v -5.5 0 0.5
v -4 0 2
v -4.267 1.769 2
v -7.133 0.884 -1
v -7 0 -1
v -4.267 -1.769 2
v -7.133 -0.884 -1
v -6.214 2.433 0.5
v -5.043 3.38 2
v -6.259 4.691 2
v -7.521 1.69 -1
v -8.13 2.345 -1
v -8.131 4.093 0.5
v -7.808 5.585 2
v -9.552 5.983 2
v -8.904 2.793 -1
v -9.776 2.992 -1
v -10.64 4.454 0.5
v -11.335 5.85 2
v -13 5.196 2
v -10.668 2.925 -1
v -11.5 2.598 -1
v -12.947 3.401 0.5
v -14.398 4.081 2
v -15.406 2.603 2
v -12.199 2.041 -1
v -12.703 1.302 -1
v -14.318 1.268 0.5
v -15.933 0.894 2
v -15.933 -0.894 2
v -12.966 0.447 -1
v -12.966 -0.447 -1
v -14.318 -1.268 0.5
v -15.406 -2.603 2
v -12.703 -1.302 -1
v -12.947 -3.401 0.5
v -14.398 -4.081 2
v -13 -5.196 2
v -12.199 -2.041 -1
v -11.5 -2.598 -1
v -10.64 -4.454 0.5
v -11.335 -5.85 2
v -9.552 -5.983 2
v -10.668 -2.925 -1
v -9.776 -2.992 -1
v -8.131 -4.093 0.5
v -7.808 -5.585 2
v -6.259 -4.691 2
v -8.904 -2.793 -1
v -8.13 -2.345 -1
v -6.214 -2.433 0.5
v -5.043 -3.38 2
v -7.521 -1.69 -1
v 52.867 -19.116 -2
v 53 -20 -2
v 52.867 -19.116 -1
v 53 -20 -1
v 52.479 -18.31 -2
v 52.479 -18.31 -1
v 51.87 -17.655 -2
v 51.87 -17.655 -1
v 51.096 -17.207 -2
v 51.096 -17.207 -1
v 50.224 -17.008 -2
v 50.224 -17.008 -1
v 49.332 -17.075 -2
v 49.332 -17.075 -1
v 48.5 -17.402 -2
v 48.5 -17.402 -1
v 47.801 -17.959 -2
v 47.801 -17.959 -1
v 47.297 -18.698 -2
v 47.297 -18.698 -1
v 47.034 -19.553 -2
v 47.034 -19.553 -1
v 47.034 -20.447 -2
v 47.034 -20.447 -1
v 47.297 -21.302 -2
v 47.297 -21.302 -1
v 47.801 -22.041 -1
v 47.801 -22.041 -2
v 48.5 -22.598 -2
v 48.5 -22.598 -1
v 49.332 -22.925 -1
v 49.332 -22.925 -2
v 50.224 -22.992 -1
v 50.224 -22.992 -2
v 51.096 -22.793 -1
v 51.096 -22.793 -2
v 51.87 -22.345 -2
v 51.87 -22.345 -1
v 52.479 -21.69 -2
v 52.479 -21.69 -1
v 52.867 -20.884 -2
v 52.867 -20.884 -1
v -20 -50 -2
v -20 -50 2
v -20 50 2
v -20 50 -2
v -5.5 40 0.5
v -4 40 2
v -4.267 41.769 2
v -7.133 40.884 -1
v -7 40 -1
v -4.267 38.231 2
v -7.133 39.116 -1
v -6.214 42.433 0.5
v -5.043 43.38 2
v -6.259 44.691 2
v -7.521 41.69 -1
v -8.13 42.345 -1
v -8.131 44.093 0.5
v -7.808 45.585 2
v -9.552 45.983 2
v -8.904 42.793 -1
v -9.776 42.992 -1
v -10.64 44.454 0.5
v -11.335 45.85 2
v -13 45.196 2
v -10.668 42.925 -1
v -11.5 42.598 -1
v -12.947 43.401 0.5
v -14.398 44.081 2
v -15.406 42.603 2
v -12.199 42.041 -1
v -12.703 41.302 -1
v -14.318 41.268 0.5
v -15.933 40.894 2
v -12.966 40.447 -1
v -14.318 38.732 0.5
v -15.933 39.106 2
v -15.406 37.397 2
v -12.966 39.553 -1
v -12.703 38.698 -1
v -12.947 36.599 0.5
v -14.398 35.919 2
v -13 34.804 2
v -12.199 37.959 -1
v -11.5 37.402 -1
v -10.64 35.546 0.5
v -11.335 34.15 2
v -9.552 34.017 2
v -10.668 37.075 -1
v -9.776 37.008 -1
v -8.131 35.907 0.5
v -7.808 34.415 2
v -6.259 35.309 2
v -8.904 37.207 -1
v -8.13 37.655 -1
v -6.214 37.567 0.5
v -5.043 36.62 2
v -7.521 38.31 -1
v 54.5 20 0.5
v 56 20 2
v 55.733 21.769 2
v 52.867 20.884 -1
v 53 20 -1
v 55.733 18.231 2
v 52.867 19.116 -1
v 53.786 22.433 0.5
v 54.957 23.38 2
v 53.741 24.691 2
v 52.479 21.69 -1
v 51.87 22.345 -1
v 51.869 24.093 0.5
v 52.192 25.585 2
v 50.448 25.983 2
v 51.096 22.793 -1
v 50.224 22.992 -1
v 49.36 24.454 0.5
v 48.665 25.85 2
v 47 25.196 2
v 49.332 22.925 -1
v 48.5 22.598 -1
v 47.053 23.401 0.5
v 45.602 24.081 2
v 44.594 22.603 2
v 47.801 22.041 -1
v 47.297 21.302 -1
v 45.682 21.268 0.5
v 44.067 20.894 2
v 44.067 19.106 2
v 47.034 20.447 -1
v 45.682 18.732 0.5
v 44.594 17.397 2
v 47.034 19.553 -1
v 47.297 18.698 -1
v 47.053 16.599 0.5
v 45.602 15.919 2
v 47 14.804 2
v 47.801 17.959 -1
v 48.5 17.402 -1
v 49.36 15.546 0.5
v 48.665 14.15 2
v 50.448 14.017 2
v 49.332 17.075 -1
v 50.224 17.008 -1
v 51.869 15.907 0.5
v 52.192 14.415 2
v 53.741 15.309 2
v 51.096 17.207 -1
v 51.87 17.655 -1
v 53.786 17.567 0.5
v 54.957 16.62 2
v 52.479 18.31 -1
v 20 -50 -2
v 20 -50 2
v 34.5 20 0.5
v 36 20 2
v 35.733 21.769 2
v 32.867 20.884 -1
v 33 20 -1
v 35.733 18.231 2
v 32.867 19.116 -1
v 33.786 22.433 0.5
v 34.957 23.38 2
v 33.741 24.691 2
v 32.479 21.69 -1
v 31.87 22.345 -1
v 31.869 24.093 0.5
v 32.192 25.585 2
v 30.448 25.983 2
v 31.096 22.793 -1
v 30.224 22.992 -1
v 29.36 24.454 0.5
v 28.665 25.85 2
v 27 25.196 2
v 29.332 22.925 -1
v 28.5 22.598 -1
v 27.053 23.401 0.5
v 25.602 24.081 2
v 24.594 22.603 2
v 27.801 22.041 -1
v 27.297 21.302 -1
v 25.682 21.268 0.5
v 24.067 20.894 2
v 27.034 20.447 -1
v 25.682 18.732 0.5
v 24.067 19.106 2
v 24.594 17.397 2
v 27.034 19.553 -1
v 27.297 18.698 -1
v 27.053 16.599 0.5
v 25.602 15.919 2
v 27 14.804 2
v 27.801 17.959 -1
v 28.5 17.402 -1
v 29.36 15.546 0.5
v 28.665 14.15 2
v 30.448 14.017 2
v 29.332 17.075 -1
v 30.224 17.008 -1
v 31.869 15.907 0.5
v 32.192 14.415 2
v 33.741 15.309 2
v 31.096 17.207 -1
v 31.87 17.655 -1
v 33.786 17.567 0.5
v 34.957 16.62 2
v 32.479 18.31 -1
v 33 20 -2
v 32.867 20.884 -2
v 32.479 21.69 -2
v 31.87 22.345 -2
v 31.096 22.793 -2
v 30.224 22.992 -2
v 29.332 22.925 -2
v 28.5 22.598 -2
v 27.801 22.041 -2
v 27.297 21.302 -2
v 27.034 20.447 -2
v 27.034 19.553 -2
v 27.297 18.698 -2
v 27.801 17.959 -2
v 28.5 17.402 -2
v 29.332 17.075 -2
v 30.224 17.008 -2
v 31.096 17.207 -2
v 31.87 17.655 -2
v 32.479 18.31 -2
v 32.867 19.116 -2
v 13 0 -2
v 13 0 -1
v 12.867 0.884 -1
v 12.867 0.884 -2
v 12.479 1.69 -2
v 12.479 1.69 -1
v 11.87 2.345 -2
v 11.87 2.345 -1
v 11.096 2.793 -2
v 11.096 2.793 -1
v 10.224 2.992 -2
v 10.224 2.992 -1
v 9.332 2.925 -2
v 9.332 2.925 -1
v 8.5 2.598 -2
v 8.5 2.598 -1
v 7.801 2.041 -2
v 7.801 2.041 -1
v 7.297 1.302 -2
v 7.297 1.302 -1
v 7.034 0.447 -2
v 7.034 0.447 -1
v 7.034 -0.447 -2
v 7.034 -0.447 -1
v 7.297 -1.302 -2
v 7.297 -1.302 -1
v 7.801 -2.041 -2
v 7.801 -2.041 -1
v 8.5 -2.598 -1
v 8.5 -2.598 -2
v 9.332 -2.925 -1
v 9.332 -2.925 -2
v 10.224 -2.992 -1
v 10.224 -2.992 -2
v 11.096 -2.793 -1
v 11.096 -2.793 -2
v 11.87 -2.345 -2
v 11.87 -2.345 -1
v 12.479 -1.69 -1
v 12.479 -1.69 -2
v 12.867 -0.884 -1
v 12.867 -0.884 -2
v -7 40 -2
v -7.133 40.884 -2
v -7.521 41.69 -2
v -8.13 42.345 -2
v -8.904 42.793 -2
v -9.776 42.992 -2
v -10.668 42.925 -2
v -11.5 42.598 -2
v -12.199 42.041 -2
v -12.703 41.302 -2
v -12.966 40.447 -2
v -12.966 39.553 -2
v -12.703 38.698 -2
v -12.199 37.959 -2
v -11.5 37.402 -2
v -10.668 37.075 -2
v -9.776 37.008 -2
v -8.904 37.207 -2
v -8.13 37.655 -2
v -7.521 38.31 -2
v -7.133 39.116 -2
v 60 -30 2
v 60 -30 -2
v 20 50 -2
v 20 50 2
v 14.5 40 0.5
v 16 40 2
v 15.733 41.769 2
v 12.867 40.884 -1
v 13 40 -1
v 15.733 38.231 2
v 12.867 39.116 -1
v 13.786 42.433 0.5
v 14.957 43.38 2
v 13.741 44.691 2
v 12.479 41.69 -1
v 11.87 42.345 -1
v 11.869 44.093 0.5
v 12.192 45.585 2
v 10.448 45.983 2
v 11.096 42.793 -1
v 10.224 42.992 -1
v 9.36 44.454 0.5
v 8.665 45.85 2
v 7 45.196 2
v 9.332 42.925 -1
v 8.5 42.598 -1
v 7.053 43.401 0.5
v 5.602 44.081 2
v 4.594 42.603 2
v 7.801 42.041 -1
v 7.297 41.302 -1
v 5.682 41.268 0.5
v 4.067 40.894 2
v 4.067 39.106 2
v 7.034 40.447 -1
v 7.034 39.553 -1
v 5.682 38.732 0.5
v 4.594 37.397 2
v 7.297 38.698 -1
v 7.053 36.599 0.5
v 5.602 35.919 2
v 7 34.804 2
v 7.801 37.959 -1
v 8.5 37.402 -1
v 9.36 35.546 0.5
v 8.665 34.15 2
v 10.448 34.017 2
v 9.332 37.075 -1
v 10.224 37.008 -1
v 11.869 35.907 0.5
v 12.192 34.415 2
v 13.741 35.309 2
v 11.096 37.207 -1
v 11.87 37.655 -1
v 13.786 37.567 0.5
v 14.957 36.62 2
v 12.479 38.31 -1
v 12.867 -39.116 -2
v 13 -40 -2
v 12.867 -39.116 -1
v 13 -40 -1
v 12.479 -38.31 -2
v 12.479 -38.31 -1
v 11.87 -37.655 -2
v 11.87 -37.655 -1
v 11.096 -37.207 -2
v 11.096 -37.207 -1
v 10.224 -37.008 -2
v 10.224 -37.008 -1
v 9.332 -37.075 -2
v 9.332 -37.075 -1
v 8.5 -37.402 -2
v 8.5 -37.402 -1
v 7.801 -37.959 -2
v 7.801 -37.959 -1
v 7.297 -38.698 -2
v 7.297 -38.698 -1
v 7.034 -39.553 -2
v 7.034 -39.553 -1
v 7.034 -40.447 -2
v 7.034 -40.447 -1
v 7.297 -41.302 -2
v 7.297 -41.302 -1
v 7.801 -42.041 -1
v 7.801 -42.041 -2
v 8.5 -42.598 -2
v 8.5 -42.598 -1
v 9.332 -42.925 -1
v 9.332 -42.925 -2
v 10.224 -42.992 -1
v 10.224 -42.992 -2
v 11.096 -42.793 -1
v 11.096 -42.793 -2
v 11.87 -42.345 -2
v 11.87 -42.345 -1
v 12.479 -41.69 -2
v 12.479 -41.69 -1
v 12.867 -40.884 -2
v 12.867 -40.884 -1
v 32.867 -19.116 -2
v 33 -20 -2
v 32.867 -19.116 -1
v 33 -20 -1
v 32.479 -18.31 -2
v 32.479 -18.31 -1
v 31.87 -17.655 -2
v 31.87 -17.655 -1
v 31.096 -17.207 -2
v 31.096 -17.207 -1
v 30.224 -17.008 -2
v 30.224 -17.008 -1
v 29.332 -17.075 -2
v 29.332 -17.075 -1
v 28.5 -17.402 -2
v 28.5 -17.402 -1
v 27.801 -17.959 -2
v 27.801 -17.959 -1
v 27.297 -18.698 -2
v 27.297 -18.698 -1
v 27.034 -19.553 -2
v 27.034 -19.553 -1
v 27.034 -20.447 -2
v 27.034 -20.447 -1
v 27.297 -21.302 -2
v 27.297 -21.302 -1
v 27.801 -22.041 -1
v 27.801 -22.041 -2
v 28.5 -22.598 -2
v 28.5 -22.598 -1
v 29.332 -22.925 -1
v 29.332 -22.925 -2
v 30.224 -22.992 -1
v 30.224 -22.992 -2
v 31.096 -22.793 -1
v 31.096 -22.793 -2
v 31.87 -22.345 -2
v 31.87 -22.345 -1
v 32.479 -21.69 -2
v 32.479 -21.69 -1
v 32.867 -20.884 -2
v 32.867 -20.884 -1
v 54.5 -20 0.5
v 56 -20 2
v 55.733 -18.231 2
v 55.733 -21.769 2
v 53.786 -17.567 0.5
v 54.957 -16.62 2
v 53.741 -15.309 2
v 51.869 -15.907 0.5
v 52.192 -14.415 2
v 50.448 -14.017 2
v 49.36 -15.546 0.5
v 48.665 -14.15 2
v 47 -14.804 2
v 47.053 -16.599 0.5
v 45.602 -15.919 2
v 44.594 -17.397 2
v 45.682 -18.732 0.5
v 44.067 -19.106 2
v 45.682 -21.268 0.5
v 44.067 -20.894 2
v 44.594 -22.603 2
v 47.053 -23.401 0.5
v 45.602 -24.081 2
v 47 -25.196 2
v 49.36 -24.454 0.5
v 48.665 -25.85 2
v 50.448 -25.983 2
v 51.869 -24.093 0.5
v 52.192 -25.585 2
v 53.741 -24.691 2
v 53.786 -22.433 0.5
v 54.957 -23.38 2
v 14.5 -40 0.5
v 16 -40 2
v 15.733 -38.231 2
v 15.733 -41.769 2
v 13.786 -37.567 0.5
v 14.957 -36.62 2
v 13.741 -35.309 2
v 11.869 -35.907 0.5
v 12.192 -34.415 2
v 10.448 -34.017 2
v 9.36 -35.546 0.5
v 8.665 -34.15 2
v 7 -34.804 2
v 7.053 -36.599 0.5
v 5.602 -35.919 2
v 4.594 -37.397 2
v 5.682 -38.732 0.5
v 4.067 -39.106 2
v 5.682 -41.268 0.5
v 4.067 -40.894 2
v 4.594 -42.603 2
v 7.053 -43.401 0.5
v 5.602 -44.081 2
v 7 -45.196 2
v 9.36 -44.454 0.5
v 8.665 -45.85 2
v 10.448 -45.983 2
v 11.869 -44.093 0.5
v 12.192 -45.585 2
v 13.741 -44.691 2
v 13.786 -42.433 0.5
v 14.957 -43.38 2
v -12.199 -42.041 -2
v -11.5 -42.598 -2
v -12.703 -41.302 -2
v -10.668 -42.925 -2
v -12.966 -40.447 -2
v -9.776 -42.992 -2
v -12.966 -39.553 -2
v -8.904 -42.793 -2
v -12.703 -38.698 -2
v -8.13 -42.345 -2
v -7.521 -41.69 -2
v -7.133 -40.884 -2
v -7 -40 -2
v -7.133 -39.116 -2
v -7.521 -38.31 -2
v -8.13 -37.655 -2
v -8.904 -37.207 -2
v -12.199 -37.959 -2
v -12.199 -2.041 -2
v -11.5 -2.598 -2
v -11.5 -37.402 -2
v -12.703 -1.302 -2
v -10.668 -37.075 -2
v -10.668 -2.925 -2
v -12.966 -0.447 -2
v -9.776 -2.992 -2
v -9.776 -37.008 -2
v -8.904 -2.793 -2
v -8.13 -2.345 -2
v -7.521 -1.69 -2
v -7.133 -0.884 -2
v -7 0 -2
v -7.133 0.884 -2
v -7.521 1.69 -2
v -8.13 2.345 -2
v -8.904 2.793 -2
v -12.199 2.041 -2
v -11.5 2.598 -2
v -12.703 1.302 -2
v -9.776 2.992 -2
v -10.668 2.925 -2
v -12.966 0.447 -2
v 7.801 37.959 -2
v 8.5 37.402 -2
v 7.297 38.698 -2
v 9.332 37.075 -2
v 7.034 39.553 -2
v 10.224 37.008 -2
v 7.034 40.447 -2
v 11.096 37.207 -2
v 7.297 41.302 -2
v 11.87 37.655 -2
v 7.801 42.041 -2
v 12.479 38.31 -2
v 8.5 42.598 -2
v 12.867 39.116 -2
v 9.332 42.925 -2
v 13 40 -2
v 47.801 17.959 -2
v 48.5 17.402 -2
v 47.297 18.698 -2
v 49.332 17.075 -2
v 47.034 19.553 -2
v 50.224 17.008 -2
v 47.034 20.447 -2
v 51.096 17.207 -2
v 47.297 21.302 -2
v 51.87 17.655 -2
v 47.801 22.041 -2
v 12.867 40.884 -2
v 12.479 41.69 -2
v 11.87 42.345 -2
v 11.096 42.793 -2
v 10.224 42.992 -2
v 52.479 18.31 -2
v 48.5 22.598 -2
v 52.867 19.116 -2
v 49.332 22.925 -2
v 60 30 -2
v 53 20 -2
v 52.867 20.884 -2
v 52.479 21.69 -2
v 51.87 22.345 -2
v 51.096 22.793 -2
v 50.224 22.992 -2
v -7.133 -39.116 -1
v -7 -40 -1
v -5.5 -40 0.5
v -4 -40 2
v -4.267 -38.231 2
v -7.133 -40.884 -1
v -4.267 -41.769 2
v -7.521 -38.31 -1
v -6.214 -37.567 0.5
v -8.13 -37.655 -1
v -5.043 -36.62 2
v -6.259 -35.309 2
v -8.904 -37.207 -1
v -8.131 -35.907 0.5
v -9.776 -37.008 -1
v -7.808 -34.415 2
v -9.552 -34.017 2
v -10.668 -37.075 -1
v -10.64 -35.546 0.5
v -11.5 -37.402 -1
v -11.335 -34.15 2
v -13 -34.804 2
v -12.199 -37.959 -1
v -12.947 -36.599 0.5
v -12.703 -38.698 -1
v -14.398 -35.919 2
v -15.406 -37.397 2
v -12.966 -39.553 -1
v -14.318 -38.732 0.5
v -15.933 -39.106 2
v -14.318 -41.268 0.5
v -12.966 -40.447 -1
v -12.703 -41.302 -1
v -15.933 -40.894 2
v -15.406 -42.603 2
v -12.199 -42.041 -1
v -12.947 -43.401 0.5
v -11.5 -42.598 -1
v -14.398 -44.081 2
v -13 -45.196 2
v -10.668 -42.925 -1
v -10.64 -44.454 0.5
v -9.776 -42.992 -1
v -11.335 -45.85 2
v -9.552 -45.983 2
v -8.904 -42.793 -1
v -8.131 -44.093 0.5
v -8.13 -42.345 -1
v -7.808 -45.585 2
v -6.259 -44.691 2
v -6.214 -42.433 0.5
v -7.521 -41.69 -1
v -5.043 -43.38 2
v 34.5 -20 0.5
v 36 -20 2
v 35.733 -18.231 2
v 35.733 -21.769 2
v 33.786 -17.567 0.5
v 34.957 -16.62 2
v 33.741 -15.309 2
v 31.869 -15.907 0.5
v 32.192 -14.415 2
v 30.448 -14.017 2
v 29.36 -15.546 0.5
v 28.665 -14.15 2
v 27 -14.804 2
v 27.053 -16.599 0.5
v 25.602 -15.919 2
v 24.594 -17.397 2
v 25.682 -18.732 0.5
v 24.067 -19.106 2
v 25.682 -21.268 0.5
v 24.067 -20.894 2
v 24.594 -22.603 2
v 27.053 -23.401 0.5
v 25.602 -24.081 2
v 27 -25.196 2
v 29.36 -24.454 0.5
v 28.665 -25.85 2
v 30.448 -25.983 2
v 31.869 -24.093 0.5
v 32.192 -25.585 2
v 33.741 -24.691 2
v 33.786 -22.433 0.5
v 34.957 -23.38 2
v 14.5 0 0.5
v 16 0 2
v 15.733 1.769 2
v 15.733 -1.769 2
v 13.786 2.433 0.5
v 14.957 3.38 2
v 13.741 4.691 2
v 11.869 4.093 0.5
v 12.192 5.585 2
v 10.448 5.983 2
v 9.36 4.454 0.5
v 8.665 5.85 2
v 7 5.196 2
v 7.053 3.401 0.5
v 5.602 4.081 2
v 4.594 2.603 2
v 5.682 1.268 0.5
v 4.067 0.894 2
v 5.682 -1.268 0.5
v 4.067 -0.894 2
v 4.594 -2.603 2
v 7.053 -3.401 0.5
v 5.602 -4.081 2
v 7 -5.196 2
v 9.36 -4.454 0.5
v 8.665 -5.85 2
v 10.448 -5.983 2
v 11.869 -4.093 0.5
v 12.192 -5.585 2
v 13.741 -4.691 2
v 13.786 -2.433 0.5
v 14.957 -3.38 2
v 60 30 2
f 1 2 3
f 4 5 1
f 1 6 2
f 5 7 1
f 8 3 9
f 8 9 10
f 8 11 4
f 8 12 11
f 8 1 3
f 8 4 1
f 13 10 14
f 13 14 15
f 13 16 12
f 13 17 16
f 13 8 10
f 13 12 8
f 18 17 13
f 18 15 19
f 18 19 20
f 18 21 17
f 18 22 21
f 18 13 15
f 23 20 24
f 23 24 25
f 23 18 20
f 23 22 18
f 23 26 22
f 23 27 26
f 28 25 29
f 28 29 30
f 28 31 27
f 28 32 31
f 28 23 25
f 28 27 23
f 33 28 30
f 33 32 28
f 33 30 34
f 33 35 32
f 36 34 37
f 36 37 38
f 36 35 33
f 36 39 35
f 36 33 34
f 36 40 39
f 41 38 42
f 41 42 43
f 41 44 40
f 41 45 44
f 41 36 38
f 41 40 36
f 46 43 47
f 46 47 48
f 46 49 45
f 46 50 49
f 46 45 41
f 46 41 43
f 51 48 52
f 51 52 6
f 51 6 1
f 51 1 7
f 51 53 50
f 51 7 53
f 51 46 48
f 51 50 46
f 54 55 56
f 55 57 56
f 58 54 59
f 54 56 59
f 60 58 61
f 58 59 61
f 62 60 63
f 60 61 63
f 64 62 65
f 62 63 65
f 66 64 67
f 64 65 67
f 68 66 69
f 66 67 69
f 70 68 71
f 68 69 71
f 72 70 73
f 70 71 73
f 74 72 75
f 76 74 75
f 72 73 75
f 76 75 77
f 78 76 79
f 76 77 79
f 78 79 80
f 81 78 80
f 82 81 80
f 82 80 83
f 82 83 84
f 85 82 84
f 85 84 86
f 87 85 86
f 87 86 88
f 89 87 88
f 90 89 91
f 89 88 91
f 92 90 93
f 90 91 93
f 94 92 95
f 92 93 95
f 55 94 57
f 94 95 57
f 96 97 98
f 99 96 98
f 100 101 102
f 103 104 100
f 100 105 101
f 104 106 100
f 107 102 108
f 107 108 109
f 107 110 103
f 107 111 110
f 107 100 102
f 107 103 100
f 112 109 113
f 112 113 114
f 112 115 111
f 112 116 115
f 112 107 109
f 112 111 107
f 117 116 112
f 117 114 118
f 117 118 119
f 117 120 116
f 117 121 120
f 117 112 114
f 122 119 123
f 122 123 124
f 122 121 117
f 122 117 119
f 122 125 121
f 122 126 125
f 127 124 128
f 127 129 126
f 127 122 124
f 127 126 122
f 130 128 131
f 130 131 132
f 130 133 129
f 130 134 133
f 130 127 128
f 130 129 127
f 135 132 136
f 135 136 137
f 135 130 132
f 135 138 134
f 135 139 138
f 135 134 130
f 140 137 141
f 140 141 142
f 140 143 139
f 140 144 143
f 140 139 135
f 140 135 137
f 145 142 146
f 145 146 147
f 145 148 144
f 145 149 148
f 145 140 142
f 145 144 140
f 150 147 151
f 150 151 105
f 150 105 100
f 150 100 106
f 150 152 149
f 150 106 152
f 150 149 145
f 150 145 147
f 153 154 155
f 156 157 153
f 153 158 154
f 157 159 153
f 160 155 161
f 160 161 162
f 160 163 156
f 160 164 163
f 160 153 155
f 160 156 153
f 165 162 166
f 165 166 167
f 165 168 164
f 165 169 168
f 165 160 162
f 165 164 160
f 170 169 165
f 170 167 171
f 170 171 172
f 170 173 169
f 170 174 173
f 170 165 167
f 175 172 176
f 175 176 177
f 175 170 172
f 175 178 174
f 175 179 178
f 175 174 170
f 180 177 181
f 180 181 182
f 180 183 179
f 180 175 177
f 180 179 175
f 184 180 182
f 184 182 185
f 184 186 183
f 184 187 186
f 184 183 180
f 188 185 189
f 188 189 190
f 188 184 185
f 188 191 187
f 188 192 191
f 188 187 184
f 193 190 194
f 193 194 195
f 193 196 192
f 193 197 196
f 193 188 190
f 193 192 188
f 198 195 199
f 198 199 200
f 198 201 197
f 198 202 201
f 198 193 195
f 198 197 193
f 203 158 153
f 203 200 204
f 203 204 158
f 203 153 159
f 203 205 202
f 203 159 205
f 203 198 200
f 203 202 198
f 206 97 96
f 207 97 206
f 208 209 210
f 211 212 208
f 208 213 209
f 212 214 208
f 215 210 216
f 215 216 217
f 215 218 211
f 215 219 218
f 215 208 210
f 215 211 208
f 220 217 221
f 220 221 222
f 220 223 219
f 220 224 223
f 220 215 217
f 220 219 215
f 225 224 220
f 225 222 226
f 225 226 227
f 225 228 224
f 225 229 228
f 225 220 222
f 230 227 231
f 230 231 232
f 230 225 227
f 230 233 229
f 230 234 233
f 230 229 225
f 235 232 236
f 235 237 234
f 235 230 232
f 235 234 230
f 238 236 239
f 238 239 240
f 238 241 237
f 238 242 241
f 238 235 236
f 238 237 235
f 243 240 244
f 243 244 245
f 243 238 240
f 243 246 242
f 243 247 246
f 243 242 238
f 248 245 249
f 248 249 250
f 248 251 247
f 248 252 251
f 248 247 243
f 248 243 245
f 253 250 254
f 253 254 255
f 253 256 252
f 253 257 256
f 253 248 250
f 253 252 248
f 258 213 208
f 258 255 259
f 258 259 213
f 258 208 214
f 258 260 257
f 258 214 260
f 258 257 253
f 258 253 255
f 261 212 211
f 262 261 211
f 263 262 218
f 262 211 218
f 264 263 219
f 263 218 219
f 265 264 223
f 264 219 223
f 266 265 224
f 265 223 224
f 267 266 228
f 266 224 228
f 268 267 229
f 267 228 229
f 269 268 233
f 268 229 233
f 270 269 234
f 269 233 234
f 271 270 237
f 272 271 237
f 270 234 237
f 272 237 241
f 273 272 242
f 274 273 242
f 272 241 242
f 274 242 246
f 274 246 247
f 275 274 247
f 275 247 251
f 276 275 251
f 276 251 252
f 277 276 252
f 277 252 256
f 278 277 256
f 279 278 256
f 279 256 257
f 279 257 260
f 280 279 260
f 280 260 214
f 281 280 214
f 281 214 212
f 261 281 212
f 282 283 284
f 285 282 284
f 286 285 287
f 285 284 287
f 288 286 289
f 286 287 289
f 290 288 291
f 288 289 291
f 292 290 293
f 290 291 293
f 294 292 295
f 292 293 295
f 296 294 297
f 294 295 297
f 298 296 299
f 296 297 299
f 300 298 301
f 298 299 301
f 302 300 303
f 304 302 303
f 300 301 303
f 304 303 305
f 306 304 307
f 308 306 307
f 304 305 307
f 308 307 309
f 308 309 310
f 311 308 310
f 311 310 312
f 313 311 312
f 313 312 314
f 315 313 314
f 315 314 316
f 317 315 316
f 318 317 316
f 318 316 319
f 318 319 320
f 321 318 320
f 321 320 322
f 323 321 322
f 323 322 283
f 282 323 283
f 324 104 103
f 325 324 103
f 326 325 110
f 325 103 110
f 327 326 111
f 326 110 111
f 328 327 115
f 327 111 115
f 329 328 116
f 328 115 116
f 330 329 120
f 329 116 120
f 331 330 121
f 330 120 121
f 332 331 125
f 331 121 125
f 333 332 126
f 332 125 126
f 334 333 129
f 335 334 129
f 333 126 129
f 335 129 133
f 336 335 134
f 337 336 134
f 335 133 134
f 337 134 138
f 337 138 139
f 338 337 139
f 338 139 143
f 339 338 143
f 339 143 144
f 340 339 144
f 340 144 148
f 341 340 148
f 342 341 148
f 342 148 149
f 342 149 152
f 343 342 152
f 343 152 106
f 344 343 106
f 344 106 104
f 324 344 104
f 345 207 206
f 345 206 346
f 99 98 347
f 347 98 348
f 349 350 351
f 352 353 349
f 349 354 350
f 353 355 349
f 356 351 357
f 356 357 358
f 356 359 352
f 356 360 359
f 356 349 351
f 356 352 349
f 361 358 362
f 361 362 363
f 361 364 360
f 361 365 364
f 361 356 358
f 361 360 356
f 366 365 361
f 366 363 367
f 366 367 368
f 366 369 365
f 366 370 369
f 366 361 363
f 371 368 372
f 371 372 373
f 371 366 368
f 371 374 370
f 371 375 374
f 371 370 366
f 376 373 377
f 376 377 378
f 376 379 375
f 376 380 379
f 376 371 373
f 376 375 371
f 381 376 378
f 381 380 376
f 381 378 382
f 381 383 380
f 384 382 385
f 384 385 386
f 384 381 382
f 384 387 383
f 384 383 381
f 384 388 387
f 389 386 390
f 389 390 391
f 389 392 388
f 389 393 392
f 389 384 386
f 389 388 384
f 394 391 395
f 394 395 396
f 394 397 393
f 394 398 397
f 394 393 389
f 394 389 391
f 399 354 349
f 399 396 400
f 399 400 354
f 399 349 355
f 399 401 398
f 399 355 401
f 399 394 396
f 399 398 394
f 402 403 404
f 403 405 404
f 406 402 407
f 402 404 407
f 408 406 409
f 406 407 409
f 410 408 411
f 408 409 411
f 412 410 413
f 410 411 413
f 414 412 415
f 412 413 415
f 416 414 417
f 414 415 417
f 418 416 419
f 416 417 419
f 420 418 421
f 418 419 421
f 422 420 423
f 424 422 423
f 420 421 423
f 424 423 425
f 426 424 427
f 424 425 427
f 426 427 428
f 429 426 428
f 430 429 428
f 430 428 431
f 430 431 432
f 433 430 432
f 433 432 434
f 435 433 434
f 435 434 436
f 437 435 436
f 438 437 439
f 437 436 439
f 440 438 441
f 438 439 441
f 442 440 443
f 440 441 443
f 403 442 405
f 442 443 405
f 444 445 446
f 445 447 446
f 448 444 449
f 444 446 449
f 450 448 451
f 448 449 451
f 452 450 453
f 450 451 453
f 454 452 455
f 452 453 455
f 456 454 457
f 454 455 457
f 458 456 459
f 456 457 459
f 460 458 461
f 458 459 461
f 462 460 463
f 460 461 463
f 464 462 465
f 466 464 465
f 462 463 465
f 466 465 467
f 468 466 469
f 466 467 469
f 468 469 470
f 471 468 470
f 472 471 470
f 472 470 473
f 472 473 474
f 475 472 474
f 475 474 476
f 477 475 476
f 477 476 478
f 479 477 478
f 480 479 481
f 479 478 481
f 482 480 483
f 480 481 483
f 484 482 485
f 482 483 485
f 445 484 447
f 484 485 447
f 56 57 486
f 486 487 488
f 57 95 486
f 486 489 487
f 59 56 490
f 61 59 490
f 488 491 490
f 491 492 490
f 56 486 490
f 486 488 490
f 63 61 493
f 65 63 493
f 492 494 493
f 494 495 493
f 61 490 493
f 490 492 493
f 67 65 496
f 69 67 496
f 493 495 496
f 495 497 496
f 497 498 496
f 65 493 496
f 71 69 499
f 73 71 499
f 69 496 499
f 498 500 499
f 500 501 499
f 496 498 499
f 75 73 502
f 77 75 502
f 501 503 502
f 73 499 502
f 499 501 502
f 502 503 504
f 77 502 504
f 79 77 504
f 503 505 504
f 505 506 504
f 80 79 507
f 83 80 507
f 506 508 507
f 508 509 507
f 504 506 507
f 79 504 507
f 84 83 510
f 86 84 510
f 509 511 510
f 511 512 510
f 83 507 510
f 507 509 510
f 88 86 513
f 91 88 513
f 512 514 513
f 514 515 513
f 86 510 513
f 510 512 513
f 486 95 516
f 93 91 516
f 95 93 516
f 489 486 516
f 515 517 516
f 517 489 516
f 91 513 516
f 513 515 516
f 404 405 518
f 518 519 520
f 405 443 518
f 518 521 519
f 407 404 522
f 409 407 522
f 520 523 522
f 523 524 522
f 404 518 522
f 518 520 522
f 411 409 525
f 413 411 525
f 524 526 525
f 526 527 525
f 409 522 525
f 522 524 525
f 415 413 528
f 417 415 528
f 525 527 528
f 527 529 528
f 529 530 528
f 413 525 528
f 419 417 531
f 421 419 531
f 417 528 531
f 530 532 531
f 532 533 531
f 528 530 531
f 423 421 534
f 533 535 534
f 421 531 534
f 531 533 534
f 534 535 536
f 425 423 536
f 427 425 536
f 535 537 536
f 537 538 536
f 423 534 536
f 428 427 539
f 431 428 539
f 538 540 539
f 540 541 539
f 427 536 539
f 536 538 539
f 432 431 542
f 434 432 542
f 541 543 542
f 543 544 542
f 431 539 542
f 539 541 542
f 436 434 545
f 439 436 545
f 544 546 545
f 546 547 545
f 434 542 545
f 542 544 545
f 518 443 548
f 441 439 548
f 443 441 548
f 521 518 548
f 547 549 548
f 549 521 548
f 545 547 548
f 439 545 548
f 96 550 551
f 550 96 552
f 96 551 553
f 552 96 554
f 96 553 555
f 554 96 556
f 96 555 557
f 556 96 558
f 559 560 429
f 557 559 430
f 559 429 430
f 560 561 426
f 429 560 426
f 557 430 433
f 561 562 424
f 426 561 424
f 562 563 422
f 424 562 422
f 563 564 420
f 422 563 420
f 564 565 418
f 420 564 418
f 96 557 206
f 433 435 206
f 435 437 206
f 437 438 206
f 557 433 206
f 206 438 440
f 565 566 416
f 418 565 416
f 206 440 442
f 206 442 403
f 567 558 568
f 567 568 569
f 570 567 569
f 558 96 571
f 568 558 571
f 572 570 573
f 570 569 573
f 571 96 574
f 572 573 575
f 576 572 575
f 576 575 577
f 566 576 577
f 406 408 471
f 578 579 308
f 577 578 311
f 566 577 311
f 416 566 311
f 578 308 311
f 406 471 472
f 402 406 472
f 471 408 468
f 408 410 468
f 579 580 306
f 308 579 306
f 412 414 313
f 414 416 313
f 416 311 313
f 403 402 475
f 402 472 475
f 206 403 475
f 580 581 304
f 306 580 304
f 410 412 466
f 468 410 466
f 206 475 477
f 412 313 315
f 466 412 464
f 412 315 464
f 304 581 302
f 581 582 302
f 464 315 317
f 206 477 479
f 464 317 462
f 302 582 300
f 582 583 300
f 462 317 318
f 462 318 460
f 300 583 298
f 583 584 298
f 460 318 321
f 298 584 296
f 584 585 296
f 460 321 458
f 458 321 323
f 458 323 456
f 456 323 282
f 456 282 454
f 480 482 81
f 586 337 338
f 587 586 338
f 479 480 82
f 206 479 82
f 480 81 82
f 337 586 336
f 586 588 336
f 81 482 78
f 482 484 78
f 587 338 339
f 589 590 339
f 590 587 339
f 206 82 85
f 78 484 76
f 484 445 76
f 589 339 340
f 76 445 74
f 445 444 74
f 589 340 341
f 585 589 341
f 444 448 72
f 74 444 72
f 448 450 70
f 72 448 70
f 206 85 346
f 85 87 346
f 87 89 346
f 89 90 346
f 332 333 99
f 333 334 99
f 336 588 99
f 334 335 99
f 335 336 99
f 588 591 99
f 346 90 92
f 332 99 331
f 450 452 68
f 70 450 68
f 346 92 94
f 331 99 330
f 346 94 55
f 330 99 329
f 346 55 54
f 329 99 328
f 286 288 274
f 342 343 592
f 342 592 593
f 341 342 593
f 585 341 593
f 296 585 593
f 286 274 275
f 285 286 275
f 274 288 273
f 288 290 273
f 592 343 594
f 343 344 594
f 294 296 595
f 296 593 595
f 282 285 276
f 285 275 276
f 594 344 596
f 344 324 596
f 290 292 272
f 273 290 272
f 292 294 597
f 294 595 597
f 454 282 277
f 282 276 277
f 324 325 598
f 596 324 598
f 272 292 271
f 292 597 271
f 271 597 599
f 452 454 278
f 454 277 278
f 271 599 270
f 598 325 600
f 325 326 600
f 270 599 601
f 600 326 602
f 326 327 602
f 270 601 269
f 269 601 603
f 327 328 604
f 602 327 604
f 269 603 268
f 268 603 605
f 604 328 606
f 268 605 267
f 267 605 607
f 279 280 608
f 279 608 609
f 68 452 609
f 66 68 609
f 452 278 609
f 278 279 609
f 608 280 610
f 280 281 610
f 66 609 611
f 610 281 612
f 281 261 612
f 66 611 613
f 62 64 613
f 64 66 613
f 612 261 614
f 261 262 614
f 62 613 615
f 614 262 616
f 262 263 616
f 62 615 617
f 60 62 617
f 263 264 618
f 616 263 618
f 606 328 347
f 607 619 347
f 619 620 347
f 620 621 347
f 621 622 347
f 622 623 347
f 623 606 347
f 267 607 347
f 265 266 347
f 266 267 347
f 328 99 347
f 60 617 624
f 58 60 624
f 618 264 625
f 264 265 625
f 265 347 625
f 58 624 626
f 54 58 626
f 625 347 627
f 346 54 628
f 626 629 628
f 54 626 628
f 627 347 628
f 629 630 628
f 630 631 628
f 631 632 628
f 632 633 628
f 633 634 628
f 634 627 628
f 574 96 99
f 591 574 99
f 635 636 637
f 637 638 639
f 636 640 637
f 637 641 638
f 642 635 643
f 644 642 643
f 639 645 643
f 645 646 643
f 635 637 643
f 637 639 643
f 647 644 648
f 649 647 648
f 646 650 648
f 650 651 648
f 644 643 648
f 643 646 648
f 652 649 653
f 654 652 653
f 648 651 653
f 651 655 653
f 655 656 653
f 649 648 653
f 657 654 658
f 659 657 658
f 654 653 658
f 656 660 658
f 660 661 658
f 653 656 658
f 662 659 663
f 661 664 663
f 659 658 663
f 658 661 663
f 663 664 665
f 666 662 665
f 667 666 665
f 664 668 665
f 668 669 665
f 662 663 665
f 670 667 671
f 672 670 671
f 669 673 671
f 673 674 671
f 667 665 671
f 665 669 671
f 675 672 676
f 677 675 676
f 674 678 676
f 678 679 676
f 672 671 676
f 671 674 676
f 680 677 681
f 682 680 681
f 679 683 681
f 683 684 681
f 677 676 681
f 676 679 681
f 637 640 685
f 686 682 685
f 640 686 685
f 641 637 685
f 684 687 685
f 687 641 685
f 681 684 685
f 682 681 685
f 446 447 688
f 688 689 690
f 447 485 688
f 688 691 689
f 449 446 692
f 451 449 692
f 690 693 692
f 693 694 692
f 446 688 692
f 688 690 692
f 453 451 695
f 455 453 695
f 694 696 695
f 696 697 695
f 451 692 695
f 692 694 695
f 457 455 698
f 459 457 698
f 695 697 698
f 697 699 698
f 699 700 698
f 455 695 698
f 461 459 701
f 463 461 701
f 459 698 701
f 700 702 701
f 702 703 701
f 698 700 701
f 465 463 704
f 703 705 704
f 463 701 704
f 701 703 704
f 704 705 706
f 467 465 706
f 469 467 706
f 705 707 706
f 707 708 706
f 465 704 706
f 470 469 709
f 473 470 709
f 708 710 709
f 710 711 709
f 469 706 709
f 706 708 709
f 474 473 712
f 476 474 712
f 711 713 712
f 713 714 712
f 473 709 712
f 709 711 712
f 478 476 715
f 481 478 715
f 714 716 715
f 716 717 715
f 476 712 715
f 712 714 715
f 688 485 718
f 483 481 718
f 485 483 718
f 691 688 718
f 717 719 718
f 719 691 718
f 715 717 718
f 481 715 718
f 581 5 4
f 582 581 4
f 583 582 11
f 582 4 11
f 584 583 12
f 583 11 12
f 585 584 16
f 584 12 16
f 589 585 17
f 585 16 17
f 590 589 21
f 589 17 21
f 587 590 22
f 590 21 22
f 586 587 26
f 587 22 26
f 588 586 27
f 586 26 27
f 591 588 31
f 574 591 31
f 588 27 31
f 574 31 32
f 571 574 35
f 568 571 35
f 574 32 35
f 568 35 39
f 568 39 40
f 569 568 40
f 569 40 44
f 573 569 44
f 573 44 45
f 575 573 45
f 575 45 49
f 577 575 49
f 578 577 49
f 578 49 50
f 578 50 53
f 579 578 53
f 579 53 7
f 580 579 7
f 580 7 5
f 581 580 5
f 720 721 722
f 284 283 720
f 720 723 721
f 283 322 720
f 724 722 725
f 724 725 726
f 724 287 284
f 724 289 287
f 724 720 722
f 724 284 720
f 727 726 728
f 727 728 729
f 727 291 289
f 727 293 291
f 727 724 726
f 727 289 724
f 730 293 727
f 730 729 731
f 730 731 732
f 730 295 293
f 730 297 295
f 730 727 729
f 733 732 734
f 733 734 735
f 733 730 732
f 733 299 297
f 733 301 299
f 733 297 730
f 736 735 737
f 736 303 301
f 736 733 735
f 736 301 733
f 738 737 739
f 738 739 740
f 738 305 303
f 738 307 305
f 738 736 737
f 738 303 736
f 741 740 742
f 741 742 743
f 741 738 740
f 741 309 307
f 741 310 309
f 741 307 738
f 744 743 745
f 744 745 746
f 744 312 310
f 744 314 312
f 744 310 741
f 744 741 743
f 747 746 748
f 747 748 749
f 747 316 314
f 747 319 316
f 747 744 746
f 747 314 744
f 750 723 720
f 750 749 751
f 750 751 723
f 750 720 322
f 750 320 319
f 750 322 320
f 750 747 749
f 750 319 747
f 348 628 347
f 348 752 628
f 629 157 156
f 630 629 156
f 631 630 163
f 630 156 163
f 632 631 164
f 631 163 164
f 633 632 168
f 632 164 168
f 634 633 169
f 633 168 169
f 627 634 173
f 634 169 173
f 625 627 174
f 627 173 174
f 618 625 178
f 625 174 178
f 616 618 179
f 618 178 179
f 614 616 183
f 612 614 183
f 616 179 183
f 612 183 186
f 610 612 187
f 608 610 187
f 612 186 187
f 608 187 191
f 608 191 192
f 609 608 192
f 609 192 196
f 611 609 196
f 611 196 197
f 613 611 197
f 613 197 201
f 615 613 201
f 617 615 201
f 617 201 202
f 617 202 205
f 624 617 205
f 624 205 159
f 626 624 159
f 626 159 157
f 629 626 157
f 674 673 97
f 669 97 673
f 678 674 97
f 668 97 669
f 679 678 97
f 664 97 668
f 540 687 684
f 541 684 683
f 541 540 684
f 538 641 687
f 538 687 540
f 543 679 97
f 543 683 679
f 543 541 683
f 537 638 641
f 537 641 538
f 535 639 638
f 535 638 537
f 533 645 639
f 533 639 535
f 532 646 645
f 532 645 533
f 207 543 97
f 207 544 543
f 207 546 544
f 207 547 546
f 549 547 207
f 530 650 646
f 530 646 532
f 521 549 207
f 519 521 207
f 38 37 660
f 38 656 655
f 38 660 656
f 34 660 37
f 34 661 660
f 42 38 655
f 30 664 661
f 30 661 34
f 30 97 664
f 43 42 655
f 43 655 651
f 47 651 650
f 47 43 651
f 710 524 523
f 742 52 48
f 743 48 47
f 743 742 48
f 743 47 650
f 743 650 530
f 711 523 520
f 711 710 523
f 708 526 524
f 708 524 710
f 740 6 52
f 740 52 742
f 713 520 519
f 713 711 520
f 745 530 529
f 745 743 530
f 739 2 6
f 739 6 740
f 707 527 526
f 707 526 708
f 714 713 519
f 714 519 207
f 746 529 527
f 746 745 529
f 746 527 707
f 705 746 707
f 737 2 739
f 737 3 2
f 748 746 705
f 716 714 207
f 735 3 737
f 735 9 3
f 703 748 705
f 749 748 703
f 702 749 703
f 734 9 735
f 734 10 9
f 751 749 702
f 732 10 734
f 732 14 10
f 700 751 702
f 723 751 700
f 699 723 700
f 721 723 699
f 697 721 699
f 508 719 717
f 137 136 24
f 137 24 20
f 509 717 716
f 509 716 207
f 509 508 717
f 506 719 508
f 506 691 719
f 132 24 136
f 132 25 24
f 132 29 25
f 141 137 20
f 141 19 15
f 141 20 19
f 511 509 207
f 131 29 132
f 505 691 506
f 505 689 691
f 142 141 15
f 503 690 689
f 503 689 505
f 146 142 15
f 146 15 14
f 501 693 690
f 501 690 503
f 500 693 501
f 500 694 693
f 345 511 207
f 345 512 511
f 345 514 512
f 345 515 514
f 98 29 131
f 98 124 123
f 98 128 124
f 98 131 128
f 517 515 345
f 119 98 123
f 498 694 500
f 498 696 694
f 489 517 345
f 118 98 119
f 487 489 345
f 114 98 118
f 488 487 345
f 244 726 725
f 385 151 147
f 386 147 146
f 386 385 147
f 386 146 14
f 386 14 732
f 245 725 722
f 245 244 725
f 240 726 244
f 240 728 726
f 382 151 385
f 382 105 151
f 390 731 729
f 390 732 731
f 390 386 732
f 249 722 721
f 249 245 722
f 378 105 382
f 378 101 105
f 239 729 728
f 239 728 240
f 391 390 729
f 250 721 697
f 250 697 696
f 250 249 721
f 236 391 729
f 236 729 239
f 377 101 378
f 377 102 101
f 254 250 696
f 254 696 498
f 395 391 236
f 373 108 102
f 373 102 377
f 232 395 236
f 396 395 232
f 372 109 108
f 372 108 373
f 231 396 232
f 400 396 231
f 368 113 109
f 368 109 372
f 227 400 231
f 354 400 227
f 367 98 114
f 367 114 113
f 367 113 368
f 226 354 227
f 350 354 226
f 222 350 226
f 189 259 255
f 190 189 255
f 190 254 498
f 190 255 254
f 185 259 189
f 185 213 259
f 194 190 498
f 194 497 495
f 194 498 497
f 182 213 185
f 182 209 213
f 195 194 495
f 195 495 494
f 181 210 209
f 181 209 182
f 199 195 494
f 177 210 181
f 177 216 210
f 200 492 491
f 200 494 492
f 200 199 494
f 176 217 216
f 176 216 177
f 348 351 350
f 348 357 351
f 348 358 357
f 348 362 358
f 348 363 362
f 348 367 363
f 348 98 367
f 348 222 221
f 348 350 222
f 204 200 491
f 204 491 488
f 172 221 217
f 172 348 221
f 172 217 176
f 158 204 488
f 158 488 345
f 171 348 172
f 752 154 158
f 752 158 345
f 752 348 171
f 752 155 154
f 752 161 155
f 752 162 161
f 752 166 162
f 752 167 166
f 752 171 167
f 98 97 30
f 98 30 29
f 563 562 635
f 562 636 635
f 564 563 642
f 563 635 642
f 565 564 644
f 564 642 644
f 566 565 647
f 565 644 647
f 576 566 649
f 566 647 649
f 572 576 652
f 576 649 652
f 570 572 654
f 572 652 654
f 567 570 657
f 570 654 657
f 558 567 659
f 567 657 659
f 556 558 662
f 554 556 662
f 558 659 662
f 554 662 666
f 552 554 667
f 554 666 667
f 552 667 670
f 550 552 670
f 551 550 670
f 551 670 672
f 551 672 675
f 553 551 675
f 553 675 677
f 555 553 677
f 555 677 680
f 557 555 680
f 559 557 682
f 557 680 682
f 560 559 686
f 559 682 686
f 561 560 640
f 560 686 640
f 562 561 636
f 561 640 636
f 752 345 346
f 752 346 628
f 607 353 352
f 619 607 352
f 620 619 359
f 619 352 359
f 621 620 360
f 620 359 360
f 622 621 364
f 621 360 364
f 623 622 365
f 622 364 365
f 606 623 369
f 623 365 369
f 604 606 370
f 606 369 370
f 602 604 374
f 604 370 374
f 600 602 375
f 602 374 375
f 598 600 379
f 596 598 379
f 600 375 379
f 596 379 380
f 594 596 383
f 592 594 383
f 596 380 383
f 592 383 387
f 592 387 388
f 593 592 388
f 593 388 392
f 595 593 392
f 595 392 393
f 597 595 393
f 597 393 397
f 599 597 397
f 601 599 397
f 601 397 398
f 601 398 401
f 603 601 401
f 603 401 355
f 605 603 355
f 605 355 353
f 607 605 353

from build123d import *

# Parameters (mm, degrees)
SKETCH1_W           = 40
SKETCH1_H           = 100
SKETCH1_H_2         = 60
BOSS_EXTRUDE1_DEPTH = 2
SKETCH2_R           = 3
CUT_EXTRUDE1_DEPTH  = 79.204859184
CHAMFER1_SIZE       = 3


# Read off the part's stored shape, not the designer's step: Mirror2
with BuildPart() as part:
    # Sketch1 → Boss-Extrude1 (new, symmetric)
    with BuildSketch(Plane.XY):
        Rectangle(SKETCH1_W, SKETCH1_H)
        with Locations((40, 0)):
            Rectangle(SKETCH1_W, SKETCH1_H_2)
        Polygon((60, 30), (20, 50), (20, 30), align=None)
        Polygon((20, -30), (20, -50), (60, -30), align=None)
    extrude(amount=BOSS_EXTRUDE1_DEPTH, both=True)

    # Sketch2 → Cut-Extrude1 (cut, through all)
    with BuildSketch(Plane.XY.offset(2)):
        with Locations((50, 20)):
            Circle(SKETCH2_R)
        with Locations((30, 20)):
            Circle(SKETCH2_R)
        with Locations((-10, 0)):
            Circle(SKETCH2_R)
        with Locations((10, 0)):
            Circle(SKETCH2_R)
        with Locations((-10, 40)):
            Circle(SKETCH2_R)
        with Locations((10, 40)):
            Circle(SKETCH2_R)
    extrude(amount=-CUT_EXTRUDE1_DEPTH, mode=Mode.SUBTRACT)

    # Chamfer1
    chamfer1_edges = [part.edges().sort_by_distance(p)[0] for p in [
        (47, 20, 2),
        (7, 40, 2),
        (27, 20, 2),
        (-13, 0, 2),
        (7, 0, 2),
        (-13, 40, 2),
    ]]
    chamfer(chamfer1_edges, length=CHAMFER1_SIZE)

    # Mirror2 outline → Mirror2 (revolve, cut)
    with BuildSketch(Plane(origin=(-10, -40, 0), x_dir=(1, 0, 0), z_dir=(0, -1, 0))):
        Polygon((0, -2), (3, -2), (3, -1), (6, 2), (0, 2), align=None)
    revolve(axis=Axis((-10, -40, 0), (0, 0, 1)), mode=Mode.SUBTRACT)

    # Mirror2 2 outline → Mirror2 2 (revolve, cut)
    with BuildSketch(Plane(origin=(50, -20, 0), x_dir=(1, 0, 0), z_dir=(0, -1, 0))):
        Polygon((0, -2), (3, -2), (3, -1), (6, 2), (0, 2), align=None)
    revolve(axis=Axis((50, -20, 0), (0, 0, 1)), mode=Mode.SUBTRACT)

    # Mirror2 3 outline → Mirror2 3 (revolve, cut)
    with BuildSketch(Plane(origin=(30, -20, 0), x_dir=(1, 0, 0), z_dir=(0, -1, 0))):
        Polygon((0, -2), (3, -2), (3, -1), (6, 2), (0, 2), align=None)
    revolve(axis=Axis((30, -20, 0), (0, 0, 1)), mode=Mode.SUBTRACT)

    # Mirror2 4 outline → Mirror2 4 (revolve, cut)
    with BuildSketch(Plane(origin=(10, -40, 0), x_dir=(1, 0, 0), z_dir=(0, -1, 0))):
        Polygon((0, -2), (3, -2), (3, -1), (6, 2), (0, 2), align=None)
    revolve(axis=Axis((10, -40, 0), (0, 0, 1)), mode=Mode.SUBTRACT)


solid = part.part
